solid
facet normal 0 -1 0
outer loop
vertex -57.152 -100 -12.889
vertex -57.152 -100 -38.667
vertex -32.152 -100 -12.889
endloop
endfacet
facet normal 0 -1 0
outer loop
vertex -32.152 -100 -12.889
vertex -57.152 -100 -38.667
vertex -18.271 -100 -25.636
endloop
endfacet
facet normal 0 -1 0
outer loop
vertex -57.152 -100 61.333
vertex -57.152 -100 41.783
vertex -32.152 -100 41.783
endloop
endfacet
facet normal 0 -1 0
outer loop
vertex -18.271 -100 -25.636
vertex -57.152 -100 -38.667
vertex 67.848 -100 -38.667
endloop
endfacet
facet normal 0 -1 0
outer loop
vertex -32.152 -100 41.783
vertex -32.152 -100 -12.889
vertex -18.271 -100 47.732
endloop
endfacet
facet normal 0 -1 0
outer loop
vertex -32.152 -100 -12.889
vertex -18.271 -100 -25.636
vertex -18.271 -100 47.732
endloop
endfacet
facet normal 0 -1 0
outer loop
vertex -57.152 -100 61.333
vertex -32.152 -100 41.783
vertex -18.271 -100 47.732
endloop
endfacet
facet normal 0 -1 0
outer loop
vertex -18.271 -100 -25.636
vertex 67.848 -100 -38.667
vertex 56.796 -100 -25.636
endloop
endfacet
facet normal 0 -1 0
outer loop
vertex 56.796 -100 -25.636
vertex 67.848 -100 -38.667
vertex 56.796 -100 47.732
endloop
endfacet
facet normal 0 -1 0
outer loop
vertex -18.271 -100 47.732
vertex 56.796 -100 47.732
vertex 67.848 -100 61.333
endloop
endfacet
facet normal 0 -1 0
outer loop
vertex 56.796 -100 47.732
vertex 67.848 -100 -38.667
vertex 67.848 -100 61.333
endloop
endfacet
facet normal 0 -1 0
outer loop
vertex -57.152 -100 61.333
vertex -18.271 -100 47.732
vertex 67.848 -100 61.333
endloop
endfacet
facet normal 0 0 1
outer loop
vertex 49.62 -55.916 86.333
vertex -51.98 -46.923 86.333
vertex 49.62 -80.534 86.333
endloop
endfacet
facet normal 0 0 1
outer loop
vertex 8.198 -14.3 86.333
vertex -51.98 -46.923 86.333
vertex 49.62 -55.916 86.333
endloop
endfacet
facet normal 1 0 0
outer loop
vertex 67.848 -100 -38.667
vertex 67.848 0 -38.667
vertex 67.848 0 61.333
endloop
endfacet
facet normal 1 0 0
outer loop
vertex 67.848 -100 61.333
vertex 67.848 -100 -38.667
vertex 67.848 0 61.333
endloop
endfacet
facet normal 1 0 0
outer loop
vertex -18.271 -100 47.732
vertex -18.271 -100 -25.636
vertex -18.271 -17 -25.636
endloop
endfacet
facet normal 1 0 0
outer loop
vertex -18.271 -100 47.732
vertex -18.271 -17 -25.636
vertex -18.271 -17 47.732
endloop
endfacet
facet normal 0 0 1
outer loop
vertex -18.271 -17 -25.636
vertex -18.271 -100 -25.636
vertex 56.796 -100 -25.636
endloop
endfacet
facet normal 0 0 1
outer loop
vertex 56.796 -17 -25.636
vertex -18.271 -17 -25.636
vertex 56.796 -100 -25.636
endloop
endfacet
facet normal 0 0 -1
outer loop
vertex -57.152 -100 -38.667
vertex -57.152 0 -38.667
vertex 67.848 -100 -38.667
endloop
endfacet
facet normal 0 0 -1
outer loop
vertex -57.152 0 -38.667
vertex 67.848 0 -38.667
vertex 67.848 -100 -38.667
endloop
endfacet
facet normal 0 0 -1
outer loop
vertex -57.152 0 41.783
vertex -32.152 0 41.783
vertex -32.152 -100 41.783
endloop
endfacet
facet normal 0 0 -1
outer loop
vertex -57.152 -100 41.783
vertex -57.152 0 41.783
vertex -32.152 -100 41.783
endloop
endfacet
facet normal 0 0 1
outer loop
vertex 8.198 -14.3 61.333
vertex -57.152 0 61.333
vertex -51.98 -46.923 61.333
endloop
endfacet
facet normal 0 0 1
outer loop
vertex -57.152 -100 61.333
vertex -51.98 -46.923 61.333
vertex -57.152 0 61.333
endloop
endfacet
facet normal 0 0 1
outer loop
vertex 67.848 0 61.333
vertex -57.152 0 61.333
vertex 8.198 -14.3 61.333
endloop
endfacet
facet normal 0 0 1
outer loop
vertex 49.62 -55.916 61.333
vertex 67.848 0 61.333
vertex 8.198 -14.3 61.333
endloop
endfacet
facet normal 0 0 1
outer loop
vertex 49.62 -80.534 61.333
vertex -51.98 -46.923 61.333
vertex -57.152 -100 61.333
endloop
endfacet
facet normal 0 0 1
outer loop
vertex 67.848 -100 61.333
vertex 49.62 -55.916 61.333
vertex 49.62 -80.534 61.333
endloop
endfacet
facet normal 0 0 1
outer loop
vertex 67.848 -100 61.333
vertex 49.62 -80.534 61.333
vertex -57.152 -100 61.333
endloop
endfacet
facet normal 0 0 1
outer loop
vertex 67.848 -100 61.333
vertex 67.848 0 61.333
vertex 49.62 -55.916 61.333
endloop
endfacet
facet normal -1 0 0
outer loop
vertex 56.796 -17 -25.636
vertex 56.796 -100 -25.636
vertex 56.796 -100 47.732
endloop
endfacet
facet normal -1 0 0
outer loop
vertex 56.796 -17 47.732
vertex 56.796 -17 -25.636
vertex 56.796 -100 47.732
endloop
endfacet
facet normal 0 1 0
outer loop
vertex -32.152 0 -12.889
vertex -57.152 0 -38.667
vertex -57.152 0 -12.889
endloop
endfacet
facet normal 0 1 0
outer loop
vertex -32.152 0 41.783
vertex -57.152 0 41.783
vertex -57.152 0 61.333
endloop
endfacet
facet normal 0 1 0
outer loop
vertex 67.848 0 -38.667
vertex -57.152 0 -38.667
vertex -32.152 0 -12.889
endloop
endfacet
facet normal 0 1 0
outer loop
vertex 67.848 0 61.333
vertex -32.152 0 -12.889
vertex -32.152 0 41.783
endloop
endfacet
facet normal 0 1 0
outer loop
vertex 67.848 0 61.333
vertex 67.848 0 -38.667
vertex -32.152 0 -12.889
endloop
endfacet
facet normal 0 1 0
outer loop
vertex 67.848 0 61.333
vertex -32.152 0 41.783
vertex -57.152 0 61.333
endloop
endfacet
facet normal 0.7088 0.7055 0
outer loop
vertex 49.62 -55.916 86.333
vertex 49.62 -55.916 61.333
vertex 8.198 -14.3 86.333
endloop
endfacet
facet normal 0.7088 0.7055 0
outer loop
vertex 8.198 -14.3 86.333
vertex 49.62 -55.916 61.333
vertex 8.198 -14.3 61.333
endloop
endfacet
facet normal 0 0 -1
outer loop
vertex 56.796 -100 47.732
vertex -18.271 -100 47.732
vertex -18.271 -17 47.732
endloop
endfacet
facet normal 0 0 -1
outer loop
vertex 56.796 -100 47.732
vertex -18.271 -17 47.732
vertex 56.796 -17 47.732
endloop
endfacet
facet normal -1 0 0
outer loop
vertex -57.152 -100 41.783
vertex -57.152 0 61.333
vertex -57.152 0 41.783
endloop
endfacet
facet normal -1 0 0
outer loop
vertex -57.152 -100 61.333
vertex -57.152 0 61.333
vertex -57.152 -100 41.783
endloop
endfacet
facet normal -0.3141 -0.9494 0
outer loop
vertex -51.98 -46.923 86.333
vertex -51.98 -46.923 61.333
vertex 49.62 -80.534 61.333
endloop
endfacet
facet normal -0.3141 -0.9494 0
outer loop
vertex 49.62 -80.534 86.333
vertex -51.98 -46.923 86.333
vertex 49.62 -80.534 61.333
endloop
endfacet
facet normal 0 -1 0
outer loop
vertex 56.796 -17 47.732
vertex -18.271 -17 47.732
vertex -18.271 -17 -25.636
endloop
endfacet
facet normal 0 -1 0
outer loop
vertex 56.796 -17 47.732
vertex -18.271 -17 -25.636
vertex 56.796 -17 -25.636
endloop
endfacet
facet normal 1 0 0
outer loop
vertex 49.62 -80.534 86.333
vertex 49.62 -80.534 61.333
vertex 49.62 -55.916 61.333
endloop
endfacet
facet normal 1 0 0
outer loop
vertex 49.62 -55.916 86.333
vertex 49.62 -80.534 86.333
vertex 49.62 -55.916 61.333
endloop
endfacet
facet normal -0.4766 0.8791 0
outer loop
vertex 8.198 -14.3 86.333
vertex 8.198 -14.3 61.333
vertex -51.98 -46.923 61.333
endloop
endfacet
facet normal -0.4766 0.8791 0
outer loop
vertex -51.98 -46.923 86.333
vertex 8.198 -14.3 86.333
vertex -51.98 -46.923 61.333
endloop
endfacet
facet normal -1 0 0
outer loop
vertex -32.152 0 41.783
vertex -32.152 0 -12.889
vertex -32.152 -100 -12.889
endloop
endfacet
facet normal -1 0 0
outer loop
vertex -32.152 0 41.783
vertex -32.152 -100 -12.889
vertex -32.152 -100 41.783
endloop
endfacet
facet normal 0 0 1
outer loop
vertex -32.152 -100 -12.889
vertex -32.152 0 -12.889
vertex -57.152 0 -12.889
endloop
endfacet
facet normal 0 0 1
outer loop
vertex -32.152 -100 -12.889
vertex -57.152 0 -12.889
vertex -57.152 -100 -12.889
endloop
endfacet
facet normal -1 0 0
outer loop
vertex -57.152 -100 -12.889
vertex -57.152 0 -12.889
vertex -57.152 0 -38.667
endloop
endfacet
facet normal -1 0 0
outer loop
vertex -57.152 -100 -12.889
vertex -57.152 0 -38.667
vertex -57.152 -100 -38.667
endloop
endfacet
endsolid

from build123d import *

# Parameters (mm, degrees)
F0_W     = 100
F0_H     = 100
F1_DEPTH = 100
F2_W     = 75.0674530864
F2_H     = 73.3678080142
F3_DEPTH = 83
F4_W     = 100
F4_H     = 25.7778791711
F5_DEPTH = 25
F6_W     = 100
F6_H     = 19.5503592491
F7_DEPTH = 25
F9_DEPTH = 25


# Not quite as in the source:
# - the program builds the solid bodies; features that only make, move or delete a surface that nothing else refers to are left out


with BuildPart() as f1:
    # F0 (on Front) → F1 (new body)
    with BuildSketch(Plane.XZ):
        with Locations((17.8484685719, 11.3331817091)):
            Rectangle(F0_W, F0_H)
    extrude(amount=F1_DEPTH)

    # F2 (on face) → F3 (cut)
    with BuildSketch(Plane.XZ.offset(100)):
        with Locations((19.2625932395, 11.0476631671)):
            Rectangle(F2_W, F2_H)
    extrude(amount=-F3_DEPTH, mode=Mode.SUBTRACT)

    # F4 (on face) → F5 (join)
    with BuildSketch(Plane(origin=(-32.1515314281, 0, 0), x_dir=(0, -1, 0), z_dir=(-1, 0, 0))):
        with Locations((50, -25.7778787054)):
            Rectangle(F4_W, F4_H)
    extrude(amount=F5_DEPTH)

    # F6 (on face) → F7 (join)
    with BuildSketch(Plane(origin=(-32.1515314281, 0, 0), x_dir=(0, -1, 0), z_dir=(-1, 0, 0))):
        with Locations((50, 51.5580020845)):
            Rectangle(F6_W, F6_H)
    extrude(amount=F7_DEPTH)

    # F8 (on face) → F9 (join)
    with BuildSketch(Plane.XY.offset(61.3331817091)):
        Polygon((8.1979809329, -14.2997056246), (-51.9804432988, -46.9225756824), (49.6200919151, -80.5339738727), (49.6200919151, -55.9161007404), align=None)
    extrude(amount=F9_DEPTH)


solid = f1.part
